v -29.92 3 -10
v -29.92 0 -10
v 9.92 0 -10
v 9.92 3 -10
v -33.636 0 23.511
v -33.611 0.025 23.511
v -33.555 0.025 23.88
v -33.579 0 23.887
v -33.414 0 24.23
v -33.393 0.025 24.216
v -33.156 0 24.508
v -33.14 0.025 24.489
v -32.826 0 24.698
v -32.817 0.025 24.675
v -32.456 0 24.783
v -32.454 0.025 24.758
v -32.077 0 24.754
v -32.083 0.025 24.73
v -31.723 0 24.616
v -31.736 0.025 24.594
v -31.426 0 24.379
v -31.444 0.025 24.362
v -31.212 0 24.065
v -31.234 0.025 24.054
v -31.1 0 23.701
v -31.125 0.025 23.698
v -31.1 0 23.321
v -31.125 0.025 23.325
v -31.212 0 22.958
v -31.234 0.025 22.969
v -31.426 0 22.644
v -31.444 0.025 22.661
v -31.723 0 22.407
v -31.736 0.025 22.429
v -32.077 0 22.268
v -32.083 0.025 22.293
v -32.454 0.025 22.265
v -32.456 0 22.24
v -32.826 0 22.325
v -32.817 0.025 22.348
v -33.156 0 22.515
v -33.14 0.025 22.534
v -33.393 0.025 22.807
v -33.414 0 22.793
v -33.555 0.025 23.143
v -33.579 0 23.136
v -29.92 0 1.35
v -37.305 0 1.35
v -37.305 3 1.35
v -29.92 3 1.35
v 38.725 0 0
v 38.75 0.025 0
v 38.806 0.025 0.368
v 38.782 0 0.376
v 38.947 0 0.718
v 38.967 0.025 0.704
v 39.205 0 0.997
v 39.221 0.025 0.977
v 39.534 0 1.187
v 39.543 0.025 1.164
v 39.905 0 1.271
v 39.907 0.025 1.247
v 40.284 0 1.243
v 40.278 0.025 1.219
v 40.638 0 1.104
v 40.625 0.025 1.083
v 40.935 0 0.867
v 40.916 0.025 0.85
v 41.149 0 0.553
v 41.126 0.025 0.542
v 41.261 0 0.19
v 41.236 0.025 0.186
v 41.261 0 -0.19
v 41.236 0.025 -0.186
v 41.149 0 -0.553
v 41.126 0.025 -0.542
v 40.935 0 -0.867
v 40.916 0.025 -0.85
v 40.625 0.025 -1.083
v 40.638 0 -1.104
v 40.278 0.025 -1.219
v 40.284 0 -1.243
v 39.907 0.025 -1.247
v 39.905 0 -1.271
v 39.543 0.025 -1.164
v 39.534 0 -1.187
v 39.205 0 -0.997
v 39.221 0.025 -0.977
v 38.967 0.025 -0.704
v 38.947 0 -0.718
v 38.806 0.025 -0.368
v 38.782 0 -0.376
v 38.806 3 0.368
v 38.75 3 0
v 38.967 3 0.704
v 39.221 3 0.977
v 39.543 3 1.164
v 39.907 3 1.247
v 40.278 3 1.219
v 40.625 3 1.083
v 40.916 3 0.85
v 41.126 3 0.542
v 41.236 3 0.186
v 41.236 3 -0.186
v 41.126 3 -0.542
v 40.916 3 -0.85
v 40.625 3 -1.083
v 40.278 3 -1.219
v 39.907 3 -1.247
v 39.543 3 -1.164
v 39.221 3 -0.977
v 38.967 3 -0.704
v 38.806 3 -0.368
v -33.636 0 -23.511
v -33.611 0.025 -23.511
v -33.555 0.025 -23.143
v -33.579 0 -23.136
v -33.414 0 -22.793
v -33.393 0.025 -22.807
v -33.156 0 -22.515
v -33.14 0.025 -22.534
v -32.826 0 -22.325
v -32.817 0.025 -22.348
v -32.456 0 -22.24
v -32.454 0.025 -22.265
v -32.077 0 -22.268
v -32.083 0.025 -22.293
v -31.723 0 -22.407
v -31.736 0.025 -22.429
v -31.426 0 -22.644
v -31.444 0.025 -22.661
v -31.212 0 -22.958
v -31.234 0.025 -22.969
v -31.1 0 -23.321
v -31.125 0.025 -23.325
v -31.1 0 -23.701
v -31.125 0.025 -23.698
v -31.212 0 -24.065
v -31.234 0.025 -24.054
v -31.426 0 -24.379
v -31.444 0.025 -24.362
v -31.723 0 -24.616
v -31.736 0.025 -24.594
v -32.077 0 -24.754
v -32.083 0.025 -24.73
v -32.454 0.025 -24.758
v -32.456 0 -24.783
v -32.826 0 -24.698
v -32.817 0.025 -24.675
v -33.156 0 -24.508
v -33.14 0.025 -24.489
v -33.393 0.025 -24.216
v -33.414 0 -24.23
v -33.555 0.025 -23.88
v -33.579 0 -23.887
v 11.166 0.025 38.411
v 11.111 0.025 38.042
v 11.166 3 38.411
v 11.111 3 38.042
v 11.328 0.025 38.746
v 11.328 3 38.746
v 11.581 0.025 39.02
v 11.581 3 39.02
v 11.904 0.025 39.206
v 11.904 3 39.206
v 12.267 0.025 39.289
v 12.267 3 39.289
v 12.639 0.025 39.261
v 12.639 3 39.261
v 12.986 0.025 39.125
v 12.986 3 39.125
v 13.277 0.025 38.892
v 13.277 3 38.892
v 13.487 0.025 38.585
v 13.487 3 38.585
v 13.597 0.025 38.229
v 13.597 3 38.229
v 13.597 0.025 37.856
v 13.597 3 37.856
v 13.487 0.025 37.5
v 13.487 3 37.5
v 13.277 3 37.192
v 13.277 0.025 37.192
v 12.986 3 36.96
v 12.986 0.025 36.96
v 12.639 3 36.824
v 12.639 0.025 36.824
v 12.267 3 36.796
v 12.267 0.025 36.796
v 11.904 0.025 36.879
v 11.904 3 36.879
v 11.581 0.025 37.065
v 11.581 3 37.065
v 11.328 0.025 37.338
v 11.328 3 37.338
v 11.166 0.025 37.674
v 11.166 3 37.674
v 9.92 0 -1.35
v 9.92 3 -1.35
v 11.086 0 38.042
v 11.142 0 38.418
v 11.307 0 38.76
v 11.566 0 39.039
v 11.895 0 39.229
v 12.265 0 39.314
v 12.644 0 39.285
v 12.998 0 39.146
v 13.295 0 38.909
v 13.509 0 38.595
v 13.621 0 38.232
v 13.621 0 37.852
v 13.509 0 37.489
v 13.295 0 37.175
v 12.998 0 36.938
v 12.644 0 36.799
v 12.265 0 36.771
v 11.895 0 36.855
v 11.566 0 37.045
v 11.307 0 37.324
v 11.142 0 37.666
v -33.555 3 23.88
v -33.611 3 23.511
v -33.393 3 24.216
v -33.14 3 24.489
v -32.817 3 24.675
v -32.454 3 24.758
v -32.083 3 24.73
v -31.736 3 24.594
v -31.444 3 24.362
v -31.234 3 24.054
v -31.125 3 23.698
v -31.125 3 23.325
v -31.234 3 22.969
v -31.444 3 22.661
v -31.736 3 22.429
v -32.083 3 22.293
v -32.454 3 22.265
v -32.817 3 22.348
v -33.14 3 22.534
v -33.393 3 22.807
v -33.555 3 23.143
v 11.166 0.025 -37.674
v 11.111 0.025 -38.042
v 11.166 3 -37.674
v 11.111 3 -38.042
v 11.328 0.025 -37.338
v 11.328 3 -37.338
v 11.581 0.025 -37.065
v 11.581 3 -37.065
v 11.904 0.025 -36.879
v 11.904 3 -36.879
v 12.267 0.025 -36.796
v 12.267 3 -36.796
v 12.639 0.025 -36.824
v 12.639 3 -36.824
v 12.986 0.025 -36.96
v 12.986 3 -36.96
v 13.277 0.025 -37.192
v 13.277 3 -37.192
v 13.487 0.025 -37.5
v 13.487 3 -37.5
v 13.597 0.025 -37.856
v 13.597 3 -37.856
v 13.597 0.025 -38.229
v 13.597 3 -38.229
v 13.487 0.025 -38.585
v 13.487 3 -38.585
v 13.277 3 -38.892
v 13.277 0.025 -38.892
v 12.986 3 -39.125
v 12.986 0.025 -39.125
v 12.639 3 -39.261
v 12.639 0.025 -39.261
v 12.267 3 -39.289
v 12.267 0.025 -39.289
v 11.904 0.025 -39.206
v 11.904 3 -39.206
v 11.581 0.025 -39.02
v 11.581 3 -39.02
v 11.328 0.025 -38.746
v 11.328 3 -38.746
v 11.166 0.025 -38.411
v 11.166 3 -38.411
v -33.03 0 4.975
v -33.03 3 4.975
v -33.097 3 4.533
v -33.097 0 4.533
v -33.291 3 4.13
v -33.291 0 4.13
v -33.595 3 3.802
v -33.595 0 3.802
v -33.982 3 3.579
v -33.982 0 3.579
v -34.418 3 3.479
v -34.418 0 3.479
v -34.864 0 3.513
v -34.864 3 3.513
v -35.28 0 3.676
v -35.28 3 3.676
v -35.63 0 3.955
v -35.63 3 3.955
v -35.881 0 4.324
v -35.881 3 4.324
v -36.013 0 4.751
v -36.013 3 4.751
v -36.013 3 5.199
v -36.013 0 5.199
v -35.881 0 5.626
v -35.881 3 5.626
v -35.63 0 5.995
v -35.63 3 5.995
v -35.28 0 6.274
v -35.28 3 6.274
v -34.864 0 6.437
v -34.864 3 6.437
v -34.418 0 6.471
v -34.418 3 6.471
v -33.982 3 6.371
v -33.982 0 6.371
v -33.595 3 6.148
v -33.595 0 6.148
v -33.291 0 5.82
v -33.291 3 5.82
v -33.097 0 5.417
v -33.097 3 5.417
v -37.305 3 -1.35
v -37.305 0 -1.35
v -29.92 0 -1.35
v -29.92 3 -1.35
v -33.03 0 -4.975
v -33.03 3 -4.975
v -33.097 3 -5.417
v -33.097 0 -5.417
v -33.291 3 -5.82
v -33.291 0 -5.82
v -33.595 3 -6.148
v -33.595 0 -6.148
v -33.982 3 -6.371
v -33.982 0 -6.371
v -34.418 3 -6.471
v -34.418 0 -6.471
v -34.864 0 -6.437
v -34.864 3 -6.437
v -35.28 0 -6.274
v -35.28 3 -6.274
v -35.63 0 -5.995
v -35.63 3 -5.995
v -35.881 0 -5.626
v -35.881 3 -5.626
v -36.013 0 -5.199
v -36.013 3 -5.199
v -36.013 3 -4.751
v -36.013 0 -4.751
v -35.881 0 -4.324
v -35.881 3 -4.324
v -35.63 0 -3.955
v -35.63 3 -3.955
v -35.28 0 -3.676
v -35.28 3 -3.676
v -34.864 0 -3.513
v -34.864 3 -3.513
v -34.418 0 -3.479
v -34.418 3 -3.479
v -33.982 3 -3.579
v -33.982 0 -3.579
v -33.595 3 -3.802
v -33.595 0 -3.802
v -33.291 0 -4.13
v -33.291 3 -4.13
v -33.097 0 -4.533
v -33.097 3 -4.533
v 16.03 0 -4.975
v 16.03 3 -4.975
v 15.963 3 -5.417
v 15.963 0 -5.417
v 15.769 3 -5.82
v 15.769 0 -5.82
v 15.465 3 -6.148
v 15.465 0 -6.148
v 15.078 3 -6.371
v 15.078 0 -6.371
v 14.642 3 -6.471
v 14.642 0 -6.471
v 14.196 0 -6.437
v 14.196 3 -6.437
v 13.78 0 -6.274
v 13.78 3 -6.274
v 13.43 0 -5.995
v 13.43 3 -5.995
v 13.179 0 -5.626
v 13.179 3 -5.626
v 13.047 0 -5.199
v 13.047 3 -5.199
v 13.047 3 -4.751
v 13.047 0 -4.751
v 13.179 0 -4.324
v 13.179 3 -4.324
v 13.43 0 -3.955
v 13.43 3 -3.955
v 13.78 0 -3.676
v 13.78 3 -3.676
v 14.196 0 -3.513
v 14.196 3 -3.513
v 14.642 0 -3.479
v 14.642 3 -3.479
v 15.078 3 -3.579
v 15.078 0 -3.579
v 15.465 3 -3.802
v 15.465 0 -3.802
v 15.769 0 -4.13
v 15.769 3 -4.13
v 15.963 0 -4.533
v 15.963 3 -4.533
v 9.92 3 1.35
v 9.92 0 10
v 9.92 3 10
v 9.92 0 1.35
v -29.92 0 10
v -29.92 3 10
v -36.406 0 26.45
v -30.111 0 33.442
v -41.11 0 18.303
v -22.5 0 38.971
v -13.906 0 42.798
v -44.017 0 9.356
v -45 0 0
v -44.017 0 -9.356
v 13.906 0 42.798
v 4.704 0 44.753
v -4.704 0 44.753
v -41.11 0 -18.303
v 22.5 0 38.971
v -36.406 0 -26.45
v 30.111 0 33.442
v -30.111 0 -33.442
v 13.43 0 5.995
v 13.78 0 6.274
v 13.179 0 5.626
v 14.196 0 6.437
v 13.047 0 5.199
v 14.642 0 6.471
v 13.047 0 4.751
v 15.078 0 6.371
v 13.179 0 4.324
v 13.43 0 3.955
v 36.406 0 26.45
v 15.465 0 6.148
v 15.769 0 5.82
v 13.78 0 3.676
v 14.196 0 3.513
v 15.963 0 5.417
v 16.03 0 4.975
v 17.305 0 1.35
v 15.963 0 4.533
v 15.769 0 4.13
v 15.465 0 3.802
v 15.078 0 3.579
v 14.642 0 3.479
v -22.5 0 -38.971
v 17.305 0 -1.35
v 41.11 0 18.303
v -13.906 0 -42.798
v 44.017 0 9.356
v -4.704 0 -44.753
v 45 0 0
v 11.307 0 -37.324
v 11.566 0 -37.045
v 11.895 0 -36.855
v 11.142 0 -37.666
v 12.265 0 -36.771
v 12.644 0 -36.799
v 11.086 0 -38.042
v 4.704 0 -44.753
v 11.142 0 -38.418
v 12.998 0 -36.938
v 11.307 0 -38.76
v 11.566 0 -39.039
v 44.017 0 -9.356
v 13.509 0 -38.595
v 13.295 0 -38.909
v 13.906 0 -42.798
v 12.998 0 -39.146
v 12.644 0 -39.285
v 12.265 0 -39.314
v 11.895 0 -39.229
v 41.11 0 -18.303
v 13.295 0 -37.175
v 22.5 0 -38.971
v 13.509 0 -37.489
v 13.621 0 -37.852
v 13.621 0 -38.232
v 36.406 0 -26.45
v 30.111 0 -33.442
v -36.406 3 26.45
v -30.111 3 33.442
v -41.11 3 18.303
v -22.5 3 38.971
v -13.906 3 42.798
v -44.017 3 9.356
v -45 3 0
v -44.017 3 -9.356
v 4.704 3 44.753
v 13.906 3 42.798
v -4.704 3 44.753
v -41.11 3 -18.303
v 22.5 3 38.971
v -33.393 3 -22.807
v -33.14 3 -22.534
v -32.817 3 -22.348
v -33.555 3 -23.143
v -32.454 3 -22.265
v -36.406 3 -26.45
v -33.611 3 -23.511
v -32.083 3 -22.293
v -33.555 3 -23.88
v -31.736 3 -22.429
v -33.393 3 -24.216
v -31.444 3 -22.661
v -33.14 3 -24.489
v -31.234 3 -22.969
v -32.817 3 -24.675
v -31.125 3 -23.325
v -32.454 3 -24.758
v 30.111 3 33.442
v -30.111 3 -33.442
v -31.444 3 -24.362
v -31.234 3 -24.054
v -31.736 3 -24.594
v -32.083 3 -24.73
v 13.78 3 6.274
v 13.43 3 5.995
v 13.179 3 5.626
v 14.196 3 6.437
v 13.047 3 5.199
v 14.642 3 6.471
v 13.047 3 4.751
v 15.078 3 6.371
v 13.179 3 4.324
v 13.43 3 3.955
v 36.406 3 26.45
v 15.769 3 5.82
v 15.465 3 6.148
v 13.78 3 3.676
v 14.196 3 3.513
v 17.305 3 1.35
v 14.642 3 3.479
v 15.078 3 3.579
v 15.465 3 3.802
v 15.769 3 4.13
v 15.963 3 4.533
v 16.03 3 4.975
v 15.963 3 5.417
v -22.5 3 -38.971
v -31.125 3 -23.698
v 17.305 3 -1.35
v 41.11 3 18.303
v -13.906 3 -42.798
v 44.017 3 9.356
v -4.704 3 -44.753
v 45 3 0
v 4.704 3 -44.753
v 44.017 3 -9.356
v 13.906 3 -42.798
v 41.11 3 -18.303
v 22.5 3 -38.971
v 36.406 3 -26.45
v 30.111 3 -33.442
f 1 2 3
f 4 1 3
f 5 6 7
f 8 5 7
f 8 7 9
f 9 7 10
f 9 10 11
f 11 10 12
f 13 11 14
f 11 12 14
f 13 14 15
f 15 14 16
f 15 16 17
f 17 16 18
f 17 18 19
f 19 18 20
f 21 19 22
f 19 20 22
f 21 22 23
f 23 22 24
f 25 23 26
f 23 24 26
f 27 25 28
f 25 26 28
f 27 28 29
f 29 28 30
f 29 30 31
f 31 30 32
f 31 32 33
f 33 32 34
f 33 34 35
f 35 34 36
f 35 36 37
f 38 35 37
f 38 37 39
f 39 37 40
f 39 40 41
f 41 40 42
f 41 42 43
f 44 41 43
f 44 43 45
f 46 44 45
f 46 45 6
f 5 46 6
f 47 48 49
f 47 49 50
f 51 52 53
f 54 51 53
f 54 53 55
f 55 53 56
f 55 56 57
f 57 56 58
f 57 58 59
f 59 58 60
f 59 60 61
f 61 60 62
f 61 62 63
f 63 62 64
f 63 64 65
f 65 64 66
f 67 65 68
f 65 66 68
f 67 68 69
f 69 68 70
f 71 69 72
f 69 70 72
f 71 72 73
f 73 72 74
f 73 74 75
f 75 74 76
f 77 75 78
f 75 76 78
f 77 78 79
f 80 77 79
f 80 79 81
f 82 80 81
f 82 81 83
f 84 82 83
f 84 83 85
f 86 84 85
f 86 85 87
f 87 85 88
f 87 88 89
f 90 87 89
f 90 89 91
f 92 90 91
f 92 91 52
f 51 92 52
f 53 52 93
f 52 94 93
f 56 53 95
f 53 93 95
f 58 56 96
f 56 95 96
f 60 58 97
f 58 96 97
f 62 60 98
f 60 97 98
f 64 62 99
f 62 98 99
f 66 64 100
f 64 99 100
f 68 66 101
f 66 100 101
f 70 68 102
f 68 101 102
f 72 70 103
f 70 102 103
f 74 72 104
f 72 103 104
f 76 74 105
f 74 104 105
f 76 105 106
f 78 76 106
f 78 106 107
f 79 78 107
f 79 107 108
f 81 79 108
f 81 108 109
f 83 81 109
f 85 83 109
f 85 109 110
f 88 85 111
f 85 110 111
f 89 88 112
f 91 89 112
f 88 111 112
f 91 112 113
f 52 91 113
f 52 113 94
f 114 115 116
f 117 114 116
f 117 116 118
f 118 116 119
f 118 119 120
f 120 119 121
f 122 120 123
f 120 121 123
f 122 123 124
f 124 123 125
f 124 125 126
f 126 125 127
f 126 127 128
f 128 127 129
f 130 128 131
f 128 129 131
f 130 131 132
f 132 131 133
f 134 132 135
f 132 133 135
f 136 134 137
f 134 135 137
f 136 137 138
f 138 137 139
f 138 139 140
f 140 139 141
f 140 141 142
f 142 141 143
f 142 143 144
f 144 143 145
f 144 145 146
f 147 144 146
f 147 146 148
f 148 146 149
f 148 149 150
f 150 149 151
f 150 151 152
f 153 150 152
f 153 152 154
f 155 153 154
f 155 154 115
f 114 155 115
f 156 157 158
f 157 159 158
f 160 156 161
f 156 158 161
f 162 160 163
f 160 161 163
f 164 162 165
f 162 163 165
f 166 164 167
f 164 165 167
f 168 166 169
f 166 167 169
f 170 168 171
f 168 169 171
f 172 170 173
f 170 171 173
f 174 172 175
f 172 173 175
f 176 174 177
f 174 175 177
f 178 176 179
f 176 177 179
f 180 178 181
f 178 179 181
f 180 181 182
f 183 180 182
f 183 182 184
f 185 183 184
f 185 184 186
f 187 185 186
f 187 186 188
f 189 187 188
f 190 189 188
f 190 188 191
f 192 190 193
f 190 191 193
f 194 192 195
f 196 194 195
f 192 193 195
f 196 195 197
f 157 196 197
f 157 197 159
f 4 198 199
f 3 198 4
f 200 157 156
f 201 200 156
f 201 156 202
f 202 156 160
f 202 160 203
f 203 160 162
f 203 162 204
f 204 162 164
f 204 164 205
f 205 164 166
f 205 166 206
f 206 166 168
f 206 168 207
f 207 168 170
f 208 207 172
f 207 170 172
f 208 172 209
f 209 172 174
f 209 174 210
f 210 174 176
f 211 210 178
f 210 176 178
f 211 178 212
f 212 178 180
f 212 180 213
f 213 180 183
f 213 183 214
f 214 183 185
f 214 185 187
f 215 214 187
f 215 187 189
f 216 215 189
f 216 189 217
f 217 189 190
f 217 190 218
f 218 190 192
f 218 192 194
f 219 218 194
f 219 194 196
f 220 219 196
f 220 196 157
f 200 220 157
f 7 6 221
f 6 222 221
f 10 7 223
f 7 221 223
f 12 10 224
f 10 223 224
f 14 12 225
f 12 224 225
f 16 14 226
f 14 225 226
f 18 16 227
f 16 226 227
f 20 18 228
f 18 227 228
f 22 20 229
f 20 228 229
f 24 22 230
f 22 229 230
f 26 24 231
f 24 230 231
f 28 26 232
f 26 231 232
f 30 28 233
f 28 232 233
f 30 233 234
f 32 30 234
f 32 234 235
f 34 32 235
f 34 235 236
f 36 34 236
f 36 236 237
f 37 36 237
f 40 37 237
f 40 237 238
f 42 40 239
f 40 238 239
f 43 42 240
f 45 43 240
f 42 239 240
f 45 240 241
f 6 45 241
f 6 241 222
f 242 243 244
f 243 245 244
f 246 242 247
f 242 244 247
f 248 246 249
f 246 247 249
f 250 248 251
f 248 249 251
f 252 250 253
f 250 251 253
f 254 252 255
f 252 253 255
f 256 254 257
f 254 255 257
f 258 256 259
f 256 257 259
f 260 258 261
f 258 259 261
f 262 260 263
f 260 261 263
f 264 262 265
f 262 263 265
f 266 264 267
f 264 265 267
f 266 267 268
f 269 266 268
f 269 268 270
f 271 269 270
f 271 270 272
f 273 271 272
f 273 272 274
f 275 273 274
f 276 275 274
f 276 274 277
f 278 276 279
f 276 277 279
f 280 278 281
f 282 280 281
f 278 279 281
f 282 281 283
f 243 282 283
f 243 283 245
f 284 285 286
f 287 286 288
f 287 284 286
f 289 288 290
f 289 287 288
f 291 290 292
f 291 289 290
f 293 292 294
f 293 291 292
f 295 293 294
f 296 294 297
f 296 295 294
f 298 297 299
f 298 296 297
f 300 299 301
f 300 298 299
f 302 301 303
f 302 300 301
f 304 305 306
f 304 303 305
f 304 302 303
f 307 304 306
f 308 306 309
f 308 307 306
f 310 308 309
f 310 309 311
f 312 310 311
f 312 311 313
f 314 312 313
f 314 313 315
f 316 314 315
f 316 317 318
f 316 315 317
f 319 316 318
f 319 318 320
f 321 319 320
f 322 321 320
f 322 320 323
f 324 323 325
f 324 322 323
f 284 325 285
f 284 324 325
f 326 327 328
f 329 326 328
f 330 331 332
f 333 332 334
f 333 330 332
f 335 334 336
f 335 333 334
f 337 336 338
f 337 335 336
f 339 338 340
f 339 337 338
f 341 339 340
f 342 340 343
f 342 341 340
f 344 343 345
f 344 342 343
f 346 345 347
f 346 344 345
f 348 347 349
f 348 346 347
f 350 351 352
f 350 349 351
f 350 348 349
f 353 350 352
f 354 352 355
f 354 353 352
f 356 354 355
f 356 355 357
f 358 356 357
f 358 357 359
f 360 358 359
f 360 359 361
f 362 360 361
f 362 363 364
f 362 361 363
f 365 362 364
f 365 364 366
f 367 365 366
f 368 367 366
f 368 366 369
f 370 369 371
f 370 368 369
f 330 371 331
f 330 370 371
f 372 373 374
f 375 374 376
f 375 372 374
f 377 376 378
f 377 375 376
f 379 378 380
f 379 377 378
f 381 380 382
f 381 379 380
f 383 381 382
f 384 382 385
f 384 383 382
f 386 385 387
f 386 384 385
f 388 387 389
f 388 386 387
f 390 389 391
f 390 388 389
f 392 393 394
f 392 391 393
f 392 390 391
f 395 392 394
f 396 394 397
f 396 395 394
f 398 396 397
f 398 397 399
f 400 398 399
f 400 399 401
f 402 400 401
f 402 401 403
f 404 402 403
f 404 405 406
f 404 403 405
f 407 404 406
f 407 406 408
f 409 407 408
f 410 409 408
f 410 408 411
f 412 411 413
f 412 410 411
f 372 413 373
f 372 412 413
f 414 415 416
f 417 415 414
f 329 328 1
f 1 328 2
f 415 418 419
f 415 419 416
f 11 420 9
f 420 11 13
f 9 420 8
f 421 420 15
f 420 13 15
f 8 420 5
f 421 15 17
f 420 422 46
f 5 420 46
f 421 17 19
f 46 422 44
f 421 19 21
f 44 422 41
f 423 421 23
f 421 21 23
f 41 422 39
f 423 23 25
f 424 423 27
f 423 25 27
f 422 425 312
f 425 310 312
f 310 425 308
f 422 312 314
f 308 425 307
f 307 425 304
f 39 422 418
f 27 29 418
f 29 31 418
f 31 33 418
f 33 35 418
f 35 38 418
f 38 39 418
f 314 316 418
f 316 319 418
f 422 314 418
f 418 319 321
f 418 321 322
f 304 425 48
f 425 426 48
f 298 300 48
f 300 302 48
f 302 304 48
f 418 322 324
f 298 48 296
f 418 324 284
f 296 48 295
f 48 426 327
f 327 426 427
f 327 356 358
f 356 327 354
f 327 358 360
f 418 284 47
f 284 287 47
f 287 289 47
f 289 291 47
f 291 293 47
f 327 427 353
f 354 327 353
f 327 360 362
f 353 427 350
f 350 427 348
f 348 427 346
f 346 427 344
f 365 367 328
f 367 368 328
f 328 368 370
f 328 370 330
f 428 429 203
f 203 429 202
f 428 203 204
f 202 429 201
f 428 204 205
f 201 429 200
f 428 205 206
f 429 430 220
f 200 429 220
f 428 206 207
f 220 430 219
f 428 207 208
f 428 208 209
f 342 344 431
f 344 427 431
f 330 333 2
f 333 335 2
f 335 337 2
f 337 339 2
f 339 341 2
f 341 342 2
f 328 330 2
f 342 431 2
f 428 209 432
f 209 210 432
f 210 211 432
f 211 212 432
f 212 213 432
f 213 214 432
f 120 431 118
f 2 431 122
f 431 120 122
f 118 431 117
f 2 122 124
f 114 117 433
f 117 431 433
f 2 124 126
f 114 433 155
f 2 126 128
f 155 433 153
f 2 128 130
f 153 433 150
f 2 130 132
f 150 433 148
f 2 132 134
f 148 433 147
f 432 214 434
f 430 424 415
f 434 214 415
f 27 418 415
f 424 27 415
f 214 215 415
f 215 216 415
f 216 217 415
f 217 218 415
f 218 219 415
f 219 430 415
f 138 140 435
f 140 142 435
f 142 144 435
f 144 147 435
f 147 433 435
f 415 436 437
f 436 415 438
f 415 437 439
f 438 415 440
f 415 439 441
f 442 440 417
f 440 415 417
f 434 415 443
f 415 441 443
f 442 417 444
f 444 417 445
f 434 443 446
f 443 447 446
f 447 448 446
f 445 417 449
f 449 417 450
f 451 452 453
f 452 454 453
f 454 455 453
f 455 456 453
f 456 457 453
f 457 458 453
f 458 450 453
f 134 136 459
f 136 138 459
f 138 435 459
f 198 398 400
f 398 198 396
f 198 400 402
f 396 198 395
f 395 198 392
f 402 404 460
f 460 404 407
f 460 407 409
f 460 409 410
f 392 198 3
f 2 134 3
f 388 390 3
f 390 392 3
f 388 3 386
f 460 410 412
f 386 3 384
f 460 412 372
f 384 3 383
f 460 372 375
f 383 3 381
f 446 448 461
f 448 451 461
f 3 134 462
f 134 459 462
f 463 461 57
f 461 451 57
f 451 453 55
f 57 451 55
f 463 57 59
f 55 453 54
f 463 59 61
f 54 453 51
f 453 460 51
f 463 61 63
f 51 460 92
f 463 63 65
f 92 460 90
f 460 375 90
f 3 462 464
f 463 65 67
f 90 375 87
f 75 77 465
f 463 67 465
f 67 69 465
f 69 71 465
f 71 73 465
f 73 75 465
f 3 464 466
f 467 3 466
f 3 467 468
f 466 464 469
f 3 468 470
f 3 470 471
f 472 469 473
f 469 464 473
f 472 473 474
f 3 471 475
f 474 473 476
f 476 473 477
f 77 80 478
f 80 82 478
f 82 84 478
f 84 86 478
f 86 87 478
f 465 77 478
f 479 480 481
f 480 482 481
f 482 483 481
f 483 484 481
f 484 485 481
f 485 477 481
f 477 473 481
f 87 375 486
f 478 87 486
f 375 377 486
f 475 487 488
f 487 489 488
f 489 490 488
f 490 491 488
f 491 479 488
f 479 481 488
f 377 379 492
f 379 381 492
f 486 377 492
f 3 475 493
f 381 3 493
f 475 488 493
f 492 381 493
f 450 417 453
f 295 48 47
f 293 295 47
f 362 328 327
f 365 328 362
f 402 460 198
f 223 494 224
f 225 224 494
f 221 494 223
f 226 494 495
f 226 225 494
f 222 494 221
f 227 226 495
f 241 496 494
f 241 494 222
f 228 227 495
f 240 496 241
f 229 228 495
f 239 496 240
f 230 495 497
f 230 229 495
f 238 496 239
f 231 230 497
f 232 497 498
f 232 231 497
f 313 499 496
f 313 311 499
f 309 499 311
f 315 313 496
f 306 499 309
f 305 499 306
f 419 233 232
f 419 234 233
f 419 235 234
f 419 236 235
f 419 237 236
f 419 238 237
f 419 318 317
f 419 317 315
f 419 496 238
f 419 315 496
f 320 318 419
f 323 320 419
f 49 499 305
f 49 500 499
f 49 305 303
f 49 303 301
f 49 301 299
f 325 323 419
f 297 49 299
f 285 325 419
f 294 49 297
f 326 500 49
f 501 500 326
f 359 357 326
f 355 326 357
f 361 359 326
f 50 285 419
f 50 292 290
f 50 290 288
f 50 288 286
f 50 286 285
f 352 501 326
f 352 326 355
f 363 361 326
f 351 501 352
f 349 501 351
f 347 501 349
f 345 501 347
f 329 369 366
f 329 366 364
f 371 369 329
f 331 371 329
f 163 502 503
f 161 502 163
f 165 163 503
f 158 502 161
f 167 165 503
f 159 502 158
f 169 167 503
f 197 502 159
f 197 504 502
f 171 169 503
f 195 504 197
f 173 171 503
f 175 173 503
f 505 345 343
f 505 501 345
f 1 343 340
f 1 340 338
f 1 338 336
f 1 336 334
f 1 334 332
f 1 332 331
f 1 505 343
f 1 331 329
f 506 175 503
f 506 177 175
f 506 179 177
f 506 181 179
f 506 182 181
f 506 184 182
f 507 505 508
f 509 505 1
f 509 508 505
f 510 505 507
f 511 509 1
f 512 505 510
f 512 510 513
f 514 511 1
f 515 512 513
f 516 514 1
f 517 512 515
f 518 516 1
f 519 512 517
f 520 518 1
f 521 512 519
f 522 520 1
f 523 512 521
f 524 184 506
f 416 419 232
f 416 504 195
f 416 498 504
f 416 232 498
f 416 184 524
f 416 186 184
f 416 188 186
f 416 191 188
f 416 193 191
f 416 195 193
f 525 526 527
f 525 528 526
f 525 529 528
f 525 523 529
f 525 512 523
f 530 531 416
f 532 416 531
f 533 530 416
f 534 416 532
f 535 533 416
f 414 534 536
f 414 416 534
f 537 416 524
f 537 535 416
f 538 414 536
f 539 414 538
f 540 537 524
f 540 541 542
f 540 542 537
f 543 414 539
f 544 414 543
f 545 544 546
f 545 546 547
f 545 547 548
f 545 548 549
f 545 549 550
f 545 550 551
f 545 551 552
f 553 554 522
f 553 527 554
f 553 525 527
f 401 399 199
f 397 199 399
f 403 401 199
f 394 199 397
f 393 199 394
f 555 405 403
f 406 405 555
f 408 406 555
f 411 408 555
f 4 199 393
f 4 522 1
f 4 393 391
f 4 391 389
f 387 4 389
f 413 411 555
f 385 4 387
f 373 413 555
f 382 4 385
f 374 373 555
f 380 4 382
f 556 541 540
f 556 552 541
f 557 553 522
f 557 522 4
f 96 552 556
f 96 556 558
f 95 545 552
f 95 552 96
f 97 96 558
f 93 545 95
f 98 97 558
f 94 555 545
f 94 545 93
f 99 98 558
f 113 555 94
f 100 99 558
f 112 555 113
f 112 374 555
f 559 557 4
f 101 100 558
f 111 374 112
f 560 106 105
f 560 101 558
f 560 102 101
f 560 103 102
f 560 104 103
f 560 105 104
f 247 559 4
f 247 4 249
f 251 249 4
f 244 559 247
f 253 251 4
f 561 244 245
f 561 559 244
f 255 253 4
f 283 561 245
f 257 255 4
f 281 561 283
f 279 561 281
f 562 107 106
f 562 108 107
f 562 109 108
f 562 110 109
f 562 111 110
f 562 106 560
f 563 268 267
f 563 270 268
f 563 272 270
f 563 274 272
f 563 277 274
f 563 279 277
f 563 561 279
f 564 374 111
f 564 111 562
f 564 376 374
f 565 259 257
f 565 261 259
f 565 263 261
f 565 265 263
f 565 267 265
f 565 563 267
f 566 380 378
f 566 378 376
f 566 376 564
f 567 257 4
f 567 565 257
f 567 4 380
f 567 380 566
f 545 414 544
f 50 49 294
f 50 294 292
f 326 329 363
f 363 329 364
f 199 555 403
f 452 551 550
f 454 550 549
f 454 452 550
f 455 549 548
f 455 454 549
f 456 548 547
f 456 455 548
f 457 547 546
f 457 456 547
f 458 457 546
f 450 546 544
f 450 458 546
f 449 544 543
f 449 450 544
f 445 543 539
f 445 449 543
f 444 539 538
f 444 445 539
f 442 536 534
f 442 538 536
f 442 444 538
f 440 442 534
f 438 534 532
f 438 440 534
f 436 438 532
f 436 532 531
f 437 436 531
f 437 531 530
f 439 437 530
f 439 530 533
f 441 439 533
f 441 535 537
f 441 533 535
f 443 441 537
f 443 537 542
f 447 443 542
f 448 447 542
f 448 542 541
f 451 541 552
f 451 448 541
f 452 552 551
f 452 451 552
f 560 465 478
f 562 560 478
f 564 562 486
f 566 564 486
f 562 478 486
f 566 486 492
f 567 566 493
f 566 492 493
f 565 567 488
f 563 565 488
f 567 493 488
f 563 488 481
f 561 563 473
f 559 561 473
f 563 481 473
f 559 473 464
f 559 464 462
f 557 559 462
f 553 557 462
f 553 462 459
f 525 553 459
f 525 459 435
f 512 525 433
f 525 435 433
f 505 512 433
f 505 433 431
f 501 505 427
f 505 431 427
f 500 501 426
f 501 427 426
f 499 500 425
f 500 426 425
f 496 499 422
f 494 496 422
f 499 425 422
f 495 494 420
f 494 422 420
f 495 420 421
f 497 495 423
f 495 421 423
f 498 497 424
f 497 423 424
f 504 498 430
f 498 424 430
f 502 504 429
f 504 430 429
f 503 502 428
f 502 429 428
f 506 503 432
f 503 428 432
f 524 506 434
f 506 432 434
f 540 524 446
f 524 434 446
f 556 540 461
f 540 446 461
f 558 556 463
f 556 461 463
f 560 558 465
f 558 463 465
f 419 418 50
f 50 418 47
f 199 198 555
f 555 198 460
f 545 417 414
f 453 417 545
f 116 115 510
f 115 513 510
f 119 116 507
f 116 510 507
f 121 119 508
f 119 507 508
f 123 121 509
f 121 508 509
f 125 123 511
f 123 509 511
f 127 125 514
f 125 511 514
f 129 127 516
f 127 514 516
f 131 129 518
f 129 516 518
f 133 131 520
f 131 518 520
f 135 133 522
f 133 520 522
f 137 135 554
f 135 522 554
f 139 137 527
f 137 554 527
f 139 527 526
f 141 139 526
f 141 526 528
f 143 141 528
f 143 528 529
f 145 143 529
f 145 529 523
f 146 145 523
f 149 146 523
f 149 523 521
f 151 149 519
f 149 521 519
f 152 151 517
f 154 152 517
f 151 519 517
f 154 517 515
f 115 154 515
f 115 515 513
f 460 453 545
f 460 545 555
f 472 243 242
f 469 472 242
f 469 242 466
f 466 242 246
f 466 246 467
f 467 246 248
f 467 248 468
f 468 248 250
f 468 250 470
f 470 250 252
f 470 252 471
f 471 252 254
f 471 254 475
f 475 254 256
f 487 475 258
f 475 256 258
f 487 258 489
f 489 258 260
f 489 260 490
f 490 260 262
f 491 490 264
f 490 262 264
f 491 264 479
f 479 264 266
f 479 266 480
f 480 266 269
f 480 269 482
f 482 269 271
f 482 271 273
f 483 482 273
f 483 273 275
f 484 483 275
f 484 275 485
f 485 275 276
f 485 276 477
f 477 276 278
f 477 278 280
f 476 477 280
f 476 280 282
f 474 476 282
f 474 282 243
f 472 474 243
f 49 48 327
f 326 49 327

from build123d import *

# Parameters (mm, degrees)
SKETCH_1_R                   = 45
EXTRUDE_1_DEPTH              = 3
HOLE_WIZARD_M3_1_D           = 2.5
HOLE_WIZARD_M3_1_CSINK_D     = 2.55
HOLE_WIZARD_M3_1_CSINK_ANGLE = 90
SKETCH_7_R                   = 1.5
SKETCH_7_W                   = 7.385
SKETCH_7_H                   = 2.7
SKETCH_7_W_2                 = 39.84
SKETCH_7_H_2                 = 20
CUT_EXTRUDE_1_DEPTH          = 4
CUT_EXTRUDE_1_DEPTH_BACK     = 1


with BuildPart() as part:
    # 草图1 → 凸台-拉伸1 (new body)
    with BuildSketch(Plane(origin=(0, 0, 0), x_dir=(1, 0, 0), z_dir=(0, 1, 0))):
        Circle(SKETCH_1_R)
    extrude(amount=EXTRUDE_1_DEPTH)

    # M3 螺纹孔的螺纹孔钻头1 (through all)
    with Locations(Plane.XZ):
        with Locations((40, 0), (12.360679775, 38.042260652), (-32.360679775, 23.511410092), (-32.360679775, -23.511410092), (12.360679775, -38.042260652)):
            CounterSinkHole(HOLE_WIZARD_M3_1_D / 2, HOLE_WIZARD_M3_1_CSINK_D / 2, counter_sink_angle=HOLE_WIZARD_M3_1_CSINK_ANGLE)

    # 草图7 → 切除-拉伸1 (cut, two sides)
    with BuildSketch(Plane(origin=(0, 0, 0), x_dir=(1, 0, 0), z_dir=(0, 1, 0))) as cut_extrude_1_sk:
        with Locations((14.53, 4.975)):
            Circle(SKETCH_7_R)
        with Locations((14.53, -4.975)):
            Circle(SKETCH_7_R)
        with Locations((-34.53, 4.975)):
            Circle(SKETCH_7_R)
        with Locations((-34.53, -4.975)):
            Circle(SKETCH_7_R)
        with Locations((13.6125, 0)):
            Rectangle(SKETCH_7_W, SKETCH_7_H)
        with Locations((-33.6125, 0)):
            Rectangle(SKETCH_7_W, SKETCH_7_H)
        with Locations((-10, 0)):
            Rectangle(SKETCH_7_W_2, SKETCH_7_H_2)
    extrude(amount=CUT_EXTRUDE_1_DEPTH, mode=Mode.SUBTRACT)
    extrude(cut_extrude_1_sk.sketch, amount=-CUT_EXTRUDE_1_DEPTH_BACK, mode=Mode.SUBTRACT)


solid = part.part
